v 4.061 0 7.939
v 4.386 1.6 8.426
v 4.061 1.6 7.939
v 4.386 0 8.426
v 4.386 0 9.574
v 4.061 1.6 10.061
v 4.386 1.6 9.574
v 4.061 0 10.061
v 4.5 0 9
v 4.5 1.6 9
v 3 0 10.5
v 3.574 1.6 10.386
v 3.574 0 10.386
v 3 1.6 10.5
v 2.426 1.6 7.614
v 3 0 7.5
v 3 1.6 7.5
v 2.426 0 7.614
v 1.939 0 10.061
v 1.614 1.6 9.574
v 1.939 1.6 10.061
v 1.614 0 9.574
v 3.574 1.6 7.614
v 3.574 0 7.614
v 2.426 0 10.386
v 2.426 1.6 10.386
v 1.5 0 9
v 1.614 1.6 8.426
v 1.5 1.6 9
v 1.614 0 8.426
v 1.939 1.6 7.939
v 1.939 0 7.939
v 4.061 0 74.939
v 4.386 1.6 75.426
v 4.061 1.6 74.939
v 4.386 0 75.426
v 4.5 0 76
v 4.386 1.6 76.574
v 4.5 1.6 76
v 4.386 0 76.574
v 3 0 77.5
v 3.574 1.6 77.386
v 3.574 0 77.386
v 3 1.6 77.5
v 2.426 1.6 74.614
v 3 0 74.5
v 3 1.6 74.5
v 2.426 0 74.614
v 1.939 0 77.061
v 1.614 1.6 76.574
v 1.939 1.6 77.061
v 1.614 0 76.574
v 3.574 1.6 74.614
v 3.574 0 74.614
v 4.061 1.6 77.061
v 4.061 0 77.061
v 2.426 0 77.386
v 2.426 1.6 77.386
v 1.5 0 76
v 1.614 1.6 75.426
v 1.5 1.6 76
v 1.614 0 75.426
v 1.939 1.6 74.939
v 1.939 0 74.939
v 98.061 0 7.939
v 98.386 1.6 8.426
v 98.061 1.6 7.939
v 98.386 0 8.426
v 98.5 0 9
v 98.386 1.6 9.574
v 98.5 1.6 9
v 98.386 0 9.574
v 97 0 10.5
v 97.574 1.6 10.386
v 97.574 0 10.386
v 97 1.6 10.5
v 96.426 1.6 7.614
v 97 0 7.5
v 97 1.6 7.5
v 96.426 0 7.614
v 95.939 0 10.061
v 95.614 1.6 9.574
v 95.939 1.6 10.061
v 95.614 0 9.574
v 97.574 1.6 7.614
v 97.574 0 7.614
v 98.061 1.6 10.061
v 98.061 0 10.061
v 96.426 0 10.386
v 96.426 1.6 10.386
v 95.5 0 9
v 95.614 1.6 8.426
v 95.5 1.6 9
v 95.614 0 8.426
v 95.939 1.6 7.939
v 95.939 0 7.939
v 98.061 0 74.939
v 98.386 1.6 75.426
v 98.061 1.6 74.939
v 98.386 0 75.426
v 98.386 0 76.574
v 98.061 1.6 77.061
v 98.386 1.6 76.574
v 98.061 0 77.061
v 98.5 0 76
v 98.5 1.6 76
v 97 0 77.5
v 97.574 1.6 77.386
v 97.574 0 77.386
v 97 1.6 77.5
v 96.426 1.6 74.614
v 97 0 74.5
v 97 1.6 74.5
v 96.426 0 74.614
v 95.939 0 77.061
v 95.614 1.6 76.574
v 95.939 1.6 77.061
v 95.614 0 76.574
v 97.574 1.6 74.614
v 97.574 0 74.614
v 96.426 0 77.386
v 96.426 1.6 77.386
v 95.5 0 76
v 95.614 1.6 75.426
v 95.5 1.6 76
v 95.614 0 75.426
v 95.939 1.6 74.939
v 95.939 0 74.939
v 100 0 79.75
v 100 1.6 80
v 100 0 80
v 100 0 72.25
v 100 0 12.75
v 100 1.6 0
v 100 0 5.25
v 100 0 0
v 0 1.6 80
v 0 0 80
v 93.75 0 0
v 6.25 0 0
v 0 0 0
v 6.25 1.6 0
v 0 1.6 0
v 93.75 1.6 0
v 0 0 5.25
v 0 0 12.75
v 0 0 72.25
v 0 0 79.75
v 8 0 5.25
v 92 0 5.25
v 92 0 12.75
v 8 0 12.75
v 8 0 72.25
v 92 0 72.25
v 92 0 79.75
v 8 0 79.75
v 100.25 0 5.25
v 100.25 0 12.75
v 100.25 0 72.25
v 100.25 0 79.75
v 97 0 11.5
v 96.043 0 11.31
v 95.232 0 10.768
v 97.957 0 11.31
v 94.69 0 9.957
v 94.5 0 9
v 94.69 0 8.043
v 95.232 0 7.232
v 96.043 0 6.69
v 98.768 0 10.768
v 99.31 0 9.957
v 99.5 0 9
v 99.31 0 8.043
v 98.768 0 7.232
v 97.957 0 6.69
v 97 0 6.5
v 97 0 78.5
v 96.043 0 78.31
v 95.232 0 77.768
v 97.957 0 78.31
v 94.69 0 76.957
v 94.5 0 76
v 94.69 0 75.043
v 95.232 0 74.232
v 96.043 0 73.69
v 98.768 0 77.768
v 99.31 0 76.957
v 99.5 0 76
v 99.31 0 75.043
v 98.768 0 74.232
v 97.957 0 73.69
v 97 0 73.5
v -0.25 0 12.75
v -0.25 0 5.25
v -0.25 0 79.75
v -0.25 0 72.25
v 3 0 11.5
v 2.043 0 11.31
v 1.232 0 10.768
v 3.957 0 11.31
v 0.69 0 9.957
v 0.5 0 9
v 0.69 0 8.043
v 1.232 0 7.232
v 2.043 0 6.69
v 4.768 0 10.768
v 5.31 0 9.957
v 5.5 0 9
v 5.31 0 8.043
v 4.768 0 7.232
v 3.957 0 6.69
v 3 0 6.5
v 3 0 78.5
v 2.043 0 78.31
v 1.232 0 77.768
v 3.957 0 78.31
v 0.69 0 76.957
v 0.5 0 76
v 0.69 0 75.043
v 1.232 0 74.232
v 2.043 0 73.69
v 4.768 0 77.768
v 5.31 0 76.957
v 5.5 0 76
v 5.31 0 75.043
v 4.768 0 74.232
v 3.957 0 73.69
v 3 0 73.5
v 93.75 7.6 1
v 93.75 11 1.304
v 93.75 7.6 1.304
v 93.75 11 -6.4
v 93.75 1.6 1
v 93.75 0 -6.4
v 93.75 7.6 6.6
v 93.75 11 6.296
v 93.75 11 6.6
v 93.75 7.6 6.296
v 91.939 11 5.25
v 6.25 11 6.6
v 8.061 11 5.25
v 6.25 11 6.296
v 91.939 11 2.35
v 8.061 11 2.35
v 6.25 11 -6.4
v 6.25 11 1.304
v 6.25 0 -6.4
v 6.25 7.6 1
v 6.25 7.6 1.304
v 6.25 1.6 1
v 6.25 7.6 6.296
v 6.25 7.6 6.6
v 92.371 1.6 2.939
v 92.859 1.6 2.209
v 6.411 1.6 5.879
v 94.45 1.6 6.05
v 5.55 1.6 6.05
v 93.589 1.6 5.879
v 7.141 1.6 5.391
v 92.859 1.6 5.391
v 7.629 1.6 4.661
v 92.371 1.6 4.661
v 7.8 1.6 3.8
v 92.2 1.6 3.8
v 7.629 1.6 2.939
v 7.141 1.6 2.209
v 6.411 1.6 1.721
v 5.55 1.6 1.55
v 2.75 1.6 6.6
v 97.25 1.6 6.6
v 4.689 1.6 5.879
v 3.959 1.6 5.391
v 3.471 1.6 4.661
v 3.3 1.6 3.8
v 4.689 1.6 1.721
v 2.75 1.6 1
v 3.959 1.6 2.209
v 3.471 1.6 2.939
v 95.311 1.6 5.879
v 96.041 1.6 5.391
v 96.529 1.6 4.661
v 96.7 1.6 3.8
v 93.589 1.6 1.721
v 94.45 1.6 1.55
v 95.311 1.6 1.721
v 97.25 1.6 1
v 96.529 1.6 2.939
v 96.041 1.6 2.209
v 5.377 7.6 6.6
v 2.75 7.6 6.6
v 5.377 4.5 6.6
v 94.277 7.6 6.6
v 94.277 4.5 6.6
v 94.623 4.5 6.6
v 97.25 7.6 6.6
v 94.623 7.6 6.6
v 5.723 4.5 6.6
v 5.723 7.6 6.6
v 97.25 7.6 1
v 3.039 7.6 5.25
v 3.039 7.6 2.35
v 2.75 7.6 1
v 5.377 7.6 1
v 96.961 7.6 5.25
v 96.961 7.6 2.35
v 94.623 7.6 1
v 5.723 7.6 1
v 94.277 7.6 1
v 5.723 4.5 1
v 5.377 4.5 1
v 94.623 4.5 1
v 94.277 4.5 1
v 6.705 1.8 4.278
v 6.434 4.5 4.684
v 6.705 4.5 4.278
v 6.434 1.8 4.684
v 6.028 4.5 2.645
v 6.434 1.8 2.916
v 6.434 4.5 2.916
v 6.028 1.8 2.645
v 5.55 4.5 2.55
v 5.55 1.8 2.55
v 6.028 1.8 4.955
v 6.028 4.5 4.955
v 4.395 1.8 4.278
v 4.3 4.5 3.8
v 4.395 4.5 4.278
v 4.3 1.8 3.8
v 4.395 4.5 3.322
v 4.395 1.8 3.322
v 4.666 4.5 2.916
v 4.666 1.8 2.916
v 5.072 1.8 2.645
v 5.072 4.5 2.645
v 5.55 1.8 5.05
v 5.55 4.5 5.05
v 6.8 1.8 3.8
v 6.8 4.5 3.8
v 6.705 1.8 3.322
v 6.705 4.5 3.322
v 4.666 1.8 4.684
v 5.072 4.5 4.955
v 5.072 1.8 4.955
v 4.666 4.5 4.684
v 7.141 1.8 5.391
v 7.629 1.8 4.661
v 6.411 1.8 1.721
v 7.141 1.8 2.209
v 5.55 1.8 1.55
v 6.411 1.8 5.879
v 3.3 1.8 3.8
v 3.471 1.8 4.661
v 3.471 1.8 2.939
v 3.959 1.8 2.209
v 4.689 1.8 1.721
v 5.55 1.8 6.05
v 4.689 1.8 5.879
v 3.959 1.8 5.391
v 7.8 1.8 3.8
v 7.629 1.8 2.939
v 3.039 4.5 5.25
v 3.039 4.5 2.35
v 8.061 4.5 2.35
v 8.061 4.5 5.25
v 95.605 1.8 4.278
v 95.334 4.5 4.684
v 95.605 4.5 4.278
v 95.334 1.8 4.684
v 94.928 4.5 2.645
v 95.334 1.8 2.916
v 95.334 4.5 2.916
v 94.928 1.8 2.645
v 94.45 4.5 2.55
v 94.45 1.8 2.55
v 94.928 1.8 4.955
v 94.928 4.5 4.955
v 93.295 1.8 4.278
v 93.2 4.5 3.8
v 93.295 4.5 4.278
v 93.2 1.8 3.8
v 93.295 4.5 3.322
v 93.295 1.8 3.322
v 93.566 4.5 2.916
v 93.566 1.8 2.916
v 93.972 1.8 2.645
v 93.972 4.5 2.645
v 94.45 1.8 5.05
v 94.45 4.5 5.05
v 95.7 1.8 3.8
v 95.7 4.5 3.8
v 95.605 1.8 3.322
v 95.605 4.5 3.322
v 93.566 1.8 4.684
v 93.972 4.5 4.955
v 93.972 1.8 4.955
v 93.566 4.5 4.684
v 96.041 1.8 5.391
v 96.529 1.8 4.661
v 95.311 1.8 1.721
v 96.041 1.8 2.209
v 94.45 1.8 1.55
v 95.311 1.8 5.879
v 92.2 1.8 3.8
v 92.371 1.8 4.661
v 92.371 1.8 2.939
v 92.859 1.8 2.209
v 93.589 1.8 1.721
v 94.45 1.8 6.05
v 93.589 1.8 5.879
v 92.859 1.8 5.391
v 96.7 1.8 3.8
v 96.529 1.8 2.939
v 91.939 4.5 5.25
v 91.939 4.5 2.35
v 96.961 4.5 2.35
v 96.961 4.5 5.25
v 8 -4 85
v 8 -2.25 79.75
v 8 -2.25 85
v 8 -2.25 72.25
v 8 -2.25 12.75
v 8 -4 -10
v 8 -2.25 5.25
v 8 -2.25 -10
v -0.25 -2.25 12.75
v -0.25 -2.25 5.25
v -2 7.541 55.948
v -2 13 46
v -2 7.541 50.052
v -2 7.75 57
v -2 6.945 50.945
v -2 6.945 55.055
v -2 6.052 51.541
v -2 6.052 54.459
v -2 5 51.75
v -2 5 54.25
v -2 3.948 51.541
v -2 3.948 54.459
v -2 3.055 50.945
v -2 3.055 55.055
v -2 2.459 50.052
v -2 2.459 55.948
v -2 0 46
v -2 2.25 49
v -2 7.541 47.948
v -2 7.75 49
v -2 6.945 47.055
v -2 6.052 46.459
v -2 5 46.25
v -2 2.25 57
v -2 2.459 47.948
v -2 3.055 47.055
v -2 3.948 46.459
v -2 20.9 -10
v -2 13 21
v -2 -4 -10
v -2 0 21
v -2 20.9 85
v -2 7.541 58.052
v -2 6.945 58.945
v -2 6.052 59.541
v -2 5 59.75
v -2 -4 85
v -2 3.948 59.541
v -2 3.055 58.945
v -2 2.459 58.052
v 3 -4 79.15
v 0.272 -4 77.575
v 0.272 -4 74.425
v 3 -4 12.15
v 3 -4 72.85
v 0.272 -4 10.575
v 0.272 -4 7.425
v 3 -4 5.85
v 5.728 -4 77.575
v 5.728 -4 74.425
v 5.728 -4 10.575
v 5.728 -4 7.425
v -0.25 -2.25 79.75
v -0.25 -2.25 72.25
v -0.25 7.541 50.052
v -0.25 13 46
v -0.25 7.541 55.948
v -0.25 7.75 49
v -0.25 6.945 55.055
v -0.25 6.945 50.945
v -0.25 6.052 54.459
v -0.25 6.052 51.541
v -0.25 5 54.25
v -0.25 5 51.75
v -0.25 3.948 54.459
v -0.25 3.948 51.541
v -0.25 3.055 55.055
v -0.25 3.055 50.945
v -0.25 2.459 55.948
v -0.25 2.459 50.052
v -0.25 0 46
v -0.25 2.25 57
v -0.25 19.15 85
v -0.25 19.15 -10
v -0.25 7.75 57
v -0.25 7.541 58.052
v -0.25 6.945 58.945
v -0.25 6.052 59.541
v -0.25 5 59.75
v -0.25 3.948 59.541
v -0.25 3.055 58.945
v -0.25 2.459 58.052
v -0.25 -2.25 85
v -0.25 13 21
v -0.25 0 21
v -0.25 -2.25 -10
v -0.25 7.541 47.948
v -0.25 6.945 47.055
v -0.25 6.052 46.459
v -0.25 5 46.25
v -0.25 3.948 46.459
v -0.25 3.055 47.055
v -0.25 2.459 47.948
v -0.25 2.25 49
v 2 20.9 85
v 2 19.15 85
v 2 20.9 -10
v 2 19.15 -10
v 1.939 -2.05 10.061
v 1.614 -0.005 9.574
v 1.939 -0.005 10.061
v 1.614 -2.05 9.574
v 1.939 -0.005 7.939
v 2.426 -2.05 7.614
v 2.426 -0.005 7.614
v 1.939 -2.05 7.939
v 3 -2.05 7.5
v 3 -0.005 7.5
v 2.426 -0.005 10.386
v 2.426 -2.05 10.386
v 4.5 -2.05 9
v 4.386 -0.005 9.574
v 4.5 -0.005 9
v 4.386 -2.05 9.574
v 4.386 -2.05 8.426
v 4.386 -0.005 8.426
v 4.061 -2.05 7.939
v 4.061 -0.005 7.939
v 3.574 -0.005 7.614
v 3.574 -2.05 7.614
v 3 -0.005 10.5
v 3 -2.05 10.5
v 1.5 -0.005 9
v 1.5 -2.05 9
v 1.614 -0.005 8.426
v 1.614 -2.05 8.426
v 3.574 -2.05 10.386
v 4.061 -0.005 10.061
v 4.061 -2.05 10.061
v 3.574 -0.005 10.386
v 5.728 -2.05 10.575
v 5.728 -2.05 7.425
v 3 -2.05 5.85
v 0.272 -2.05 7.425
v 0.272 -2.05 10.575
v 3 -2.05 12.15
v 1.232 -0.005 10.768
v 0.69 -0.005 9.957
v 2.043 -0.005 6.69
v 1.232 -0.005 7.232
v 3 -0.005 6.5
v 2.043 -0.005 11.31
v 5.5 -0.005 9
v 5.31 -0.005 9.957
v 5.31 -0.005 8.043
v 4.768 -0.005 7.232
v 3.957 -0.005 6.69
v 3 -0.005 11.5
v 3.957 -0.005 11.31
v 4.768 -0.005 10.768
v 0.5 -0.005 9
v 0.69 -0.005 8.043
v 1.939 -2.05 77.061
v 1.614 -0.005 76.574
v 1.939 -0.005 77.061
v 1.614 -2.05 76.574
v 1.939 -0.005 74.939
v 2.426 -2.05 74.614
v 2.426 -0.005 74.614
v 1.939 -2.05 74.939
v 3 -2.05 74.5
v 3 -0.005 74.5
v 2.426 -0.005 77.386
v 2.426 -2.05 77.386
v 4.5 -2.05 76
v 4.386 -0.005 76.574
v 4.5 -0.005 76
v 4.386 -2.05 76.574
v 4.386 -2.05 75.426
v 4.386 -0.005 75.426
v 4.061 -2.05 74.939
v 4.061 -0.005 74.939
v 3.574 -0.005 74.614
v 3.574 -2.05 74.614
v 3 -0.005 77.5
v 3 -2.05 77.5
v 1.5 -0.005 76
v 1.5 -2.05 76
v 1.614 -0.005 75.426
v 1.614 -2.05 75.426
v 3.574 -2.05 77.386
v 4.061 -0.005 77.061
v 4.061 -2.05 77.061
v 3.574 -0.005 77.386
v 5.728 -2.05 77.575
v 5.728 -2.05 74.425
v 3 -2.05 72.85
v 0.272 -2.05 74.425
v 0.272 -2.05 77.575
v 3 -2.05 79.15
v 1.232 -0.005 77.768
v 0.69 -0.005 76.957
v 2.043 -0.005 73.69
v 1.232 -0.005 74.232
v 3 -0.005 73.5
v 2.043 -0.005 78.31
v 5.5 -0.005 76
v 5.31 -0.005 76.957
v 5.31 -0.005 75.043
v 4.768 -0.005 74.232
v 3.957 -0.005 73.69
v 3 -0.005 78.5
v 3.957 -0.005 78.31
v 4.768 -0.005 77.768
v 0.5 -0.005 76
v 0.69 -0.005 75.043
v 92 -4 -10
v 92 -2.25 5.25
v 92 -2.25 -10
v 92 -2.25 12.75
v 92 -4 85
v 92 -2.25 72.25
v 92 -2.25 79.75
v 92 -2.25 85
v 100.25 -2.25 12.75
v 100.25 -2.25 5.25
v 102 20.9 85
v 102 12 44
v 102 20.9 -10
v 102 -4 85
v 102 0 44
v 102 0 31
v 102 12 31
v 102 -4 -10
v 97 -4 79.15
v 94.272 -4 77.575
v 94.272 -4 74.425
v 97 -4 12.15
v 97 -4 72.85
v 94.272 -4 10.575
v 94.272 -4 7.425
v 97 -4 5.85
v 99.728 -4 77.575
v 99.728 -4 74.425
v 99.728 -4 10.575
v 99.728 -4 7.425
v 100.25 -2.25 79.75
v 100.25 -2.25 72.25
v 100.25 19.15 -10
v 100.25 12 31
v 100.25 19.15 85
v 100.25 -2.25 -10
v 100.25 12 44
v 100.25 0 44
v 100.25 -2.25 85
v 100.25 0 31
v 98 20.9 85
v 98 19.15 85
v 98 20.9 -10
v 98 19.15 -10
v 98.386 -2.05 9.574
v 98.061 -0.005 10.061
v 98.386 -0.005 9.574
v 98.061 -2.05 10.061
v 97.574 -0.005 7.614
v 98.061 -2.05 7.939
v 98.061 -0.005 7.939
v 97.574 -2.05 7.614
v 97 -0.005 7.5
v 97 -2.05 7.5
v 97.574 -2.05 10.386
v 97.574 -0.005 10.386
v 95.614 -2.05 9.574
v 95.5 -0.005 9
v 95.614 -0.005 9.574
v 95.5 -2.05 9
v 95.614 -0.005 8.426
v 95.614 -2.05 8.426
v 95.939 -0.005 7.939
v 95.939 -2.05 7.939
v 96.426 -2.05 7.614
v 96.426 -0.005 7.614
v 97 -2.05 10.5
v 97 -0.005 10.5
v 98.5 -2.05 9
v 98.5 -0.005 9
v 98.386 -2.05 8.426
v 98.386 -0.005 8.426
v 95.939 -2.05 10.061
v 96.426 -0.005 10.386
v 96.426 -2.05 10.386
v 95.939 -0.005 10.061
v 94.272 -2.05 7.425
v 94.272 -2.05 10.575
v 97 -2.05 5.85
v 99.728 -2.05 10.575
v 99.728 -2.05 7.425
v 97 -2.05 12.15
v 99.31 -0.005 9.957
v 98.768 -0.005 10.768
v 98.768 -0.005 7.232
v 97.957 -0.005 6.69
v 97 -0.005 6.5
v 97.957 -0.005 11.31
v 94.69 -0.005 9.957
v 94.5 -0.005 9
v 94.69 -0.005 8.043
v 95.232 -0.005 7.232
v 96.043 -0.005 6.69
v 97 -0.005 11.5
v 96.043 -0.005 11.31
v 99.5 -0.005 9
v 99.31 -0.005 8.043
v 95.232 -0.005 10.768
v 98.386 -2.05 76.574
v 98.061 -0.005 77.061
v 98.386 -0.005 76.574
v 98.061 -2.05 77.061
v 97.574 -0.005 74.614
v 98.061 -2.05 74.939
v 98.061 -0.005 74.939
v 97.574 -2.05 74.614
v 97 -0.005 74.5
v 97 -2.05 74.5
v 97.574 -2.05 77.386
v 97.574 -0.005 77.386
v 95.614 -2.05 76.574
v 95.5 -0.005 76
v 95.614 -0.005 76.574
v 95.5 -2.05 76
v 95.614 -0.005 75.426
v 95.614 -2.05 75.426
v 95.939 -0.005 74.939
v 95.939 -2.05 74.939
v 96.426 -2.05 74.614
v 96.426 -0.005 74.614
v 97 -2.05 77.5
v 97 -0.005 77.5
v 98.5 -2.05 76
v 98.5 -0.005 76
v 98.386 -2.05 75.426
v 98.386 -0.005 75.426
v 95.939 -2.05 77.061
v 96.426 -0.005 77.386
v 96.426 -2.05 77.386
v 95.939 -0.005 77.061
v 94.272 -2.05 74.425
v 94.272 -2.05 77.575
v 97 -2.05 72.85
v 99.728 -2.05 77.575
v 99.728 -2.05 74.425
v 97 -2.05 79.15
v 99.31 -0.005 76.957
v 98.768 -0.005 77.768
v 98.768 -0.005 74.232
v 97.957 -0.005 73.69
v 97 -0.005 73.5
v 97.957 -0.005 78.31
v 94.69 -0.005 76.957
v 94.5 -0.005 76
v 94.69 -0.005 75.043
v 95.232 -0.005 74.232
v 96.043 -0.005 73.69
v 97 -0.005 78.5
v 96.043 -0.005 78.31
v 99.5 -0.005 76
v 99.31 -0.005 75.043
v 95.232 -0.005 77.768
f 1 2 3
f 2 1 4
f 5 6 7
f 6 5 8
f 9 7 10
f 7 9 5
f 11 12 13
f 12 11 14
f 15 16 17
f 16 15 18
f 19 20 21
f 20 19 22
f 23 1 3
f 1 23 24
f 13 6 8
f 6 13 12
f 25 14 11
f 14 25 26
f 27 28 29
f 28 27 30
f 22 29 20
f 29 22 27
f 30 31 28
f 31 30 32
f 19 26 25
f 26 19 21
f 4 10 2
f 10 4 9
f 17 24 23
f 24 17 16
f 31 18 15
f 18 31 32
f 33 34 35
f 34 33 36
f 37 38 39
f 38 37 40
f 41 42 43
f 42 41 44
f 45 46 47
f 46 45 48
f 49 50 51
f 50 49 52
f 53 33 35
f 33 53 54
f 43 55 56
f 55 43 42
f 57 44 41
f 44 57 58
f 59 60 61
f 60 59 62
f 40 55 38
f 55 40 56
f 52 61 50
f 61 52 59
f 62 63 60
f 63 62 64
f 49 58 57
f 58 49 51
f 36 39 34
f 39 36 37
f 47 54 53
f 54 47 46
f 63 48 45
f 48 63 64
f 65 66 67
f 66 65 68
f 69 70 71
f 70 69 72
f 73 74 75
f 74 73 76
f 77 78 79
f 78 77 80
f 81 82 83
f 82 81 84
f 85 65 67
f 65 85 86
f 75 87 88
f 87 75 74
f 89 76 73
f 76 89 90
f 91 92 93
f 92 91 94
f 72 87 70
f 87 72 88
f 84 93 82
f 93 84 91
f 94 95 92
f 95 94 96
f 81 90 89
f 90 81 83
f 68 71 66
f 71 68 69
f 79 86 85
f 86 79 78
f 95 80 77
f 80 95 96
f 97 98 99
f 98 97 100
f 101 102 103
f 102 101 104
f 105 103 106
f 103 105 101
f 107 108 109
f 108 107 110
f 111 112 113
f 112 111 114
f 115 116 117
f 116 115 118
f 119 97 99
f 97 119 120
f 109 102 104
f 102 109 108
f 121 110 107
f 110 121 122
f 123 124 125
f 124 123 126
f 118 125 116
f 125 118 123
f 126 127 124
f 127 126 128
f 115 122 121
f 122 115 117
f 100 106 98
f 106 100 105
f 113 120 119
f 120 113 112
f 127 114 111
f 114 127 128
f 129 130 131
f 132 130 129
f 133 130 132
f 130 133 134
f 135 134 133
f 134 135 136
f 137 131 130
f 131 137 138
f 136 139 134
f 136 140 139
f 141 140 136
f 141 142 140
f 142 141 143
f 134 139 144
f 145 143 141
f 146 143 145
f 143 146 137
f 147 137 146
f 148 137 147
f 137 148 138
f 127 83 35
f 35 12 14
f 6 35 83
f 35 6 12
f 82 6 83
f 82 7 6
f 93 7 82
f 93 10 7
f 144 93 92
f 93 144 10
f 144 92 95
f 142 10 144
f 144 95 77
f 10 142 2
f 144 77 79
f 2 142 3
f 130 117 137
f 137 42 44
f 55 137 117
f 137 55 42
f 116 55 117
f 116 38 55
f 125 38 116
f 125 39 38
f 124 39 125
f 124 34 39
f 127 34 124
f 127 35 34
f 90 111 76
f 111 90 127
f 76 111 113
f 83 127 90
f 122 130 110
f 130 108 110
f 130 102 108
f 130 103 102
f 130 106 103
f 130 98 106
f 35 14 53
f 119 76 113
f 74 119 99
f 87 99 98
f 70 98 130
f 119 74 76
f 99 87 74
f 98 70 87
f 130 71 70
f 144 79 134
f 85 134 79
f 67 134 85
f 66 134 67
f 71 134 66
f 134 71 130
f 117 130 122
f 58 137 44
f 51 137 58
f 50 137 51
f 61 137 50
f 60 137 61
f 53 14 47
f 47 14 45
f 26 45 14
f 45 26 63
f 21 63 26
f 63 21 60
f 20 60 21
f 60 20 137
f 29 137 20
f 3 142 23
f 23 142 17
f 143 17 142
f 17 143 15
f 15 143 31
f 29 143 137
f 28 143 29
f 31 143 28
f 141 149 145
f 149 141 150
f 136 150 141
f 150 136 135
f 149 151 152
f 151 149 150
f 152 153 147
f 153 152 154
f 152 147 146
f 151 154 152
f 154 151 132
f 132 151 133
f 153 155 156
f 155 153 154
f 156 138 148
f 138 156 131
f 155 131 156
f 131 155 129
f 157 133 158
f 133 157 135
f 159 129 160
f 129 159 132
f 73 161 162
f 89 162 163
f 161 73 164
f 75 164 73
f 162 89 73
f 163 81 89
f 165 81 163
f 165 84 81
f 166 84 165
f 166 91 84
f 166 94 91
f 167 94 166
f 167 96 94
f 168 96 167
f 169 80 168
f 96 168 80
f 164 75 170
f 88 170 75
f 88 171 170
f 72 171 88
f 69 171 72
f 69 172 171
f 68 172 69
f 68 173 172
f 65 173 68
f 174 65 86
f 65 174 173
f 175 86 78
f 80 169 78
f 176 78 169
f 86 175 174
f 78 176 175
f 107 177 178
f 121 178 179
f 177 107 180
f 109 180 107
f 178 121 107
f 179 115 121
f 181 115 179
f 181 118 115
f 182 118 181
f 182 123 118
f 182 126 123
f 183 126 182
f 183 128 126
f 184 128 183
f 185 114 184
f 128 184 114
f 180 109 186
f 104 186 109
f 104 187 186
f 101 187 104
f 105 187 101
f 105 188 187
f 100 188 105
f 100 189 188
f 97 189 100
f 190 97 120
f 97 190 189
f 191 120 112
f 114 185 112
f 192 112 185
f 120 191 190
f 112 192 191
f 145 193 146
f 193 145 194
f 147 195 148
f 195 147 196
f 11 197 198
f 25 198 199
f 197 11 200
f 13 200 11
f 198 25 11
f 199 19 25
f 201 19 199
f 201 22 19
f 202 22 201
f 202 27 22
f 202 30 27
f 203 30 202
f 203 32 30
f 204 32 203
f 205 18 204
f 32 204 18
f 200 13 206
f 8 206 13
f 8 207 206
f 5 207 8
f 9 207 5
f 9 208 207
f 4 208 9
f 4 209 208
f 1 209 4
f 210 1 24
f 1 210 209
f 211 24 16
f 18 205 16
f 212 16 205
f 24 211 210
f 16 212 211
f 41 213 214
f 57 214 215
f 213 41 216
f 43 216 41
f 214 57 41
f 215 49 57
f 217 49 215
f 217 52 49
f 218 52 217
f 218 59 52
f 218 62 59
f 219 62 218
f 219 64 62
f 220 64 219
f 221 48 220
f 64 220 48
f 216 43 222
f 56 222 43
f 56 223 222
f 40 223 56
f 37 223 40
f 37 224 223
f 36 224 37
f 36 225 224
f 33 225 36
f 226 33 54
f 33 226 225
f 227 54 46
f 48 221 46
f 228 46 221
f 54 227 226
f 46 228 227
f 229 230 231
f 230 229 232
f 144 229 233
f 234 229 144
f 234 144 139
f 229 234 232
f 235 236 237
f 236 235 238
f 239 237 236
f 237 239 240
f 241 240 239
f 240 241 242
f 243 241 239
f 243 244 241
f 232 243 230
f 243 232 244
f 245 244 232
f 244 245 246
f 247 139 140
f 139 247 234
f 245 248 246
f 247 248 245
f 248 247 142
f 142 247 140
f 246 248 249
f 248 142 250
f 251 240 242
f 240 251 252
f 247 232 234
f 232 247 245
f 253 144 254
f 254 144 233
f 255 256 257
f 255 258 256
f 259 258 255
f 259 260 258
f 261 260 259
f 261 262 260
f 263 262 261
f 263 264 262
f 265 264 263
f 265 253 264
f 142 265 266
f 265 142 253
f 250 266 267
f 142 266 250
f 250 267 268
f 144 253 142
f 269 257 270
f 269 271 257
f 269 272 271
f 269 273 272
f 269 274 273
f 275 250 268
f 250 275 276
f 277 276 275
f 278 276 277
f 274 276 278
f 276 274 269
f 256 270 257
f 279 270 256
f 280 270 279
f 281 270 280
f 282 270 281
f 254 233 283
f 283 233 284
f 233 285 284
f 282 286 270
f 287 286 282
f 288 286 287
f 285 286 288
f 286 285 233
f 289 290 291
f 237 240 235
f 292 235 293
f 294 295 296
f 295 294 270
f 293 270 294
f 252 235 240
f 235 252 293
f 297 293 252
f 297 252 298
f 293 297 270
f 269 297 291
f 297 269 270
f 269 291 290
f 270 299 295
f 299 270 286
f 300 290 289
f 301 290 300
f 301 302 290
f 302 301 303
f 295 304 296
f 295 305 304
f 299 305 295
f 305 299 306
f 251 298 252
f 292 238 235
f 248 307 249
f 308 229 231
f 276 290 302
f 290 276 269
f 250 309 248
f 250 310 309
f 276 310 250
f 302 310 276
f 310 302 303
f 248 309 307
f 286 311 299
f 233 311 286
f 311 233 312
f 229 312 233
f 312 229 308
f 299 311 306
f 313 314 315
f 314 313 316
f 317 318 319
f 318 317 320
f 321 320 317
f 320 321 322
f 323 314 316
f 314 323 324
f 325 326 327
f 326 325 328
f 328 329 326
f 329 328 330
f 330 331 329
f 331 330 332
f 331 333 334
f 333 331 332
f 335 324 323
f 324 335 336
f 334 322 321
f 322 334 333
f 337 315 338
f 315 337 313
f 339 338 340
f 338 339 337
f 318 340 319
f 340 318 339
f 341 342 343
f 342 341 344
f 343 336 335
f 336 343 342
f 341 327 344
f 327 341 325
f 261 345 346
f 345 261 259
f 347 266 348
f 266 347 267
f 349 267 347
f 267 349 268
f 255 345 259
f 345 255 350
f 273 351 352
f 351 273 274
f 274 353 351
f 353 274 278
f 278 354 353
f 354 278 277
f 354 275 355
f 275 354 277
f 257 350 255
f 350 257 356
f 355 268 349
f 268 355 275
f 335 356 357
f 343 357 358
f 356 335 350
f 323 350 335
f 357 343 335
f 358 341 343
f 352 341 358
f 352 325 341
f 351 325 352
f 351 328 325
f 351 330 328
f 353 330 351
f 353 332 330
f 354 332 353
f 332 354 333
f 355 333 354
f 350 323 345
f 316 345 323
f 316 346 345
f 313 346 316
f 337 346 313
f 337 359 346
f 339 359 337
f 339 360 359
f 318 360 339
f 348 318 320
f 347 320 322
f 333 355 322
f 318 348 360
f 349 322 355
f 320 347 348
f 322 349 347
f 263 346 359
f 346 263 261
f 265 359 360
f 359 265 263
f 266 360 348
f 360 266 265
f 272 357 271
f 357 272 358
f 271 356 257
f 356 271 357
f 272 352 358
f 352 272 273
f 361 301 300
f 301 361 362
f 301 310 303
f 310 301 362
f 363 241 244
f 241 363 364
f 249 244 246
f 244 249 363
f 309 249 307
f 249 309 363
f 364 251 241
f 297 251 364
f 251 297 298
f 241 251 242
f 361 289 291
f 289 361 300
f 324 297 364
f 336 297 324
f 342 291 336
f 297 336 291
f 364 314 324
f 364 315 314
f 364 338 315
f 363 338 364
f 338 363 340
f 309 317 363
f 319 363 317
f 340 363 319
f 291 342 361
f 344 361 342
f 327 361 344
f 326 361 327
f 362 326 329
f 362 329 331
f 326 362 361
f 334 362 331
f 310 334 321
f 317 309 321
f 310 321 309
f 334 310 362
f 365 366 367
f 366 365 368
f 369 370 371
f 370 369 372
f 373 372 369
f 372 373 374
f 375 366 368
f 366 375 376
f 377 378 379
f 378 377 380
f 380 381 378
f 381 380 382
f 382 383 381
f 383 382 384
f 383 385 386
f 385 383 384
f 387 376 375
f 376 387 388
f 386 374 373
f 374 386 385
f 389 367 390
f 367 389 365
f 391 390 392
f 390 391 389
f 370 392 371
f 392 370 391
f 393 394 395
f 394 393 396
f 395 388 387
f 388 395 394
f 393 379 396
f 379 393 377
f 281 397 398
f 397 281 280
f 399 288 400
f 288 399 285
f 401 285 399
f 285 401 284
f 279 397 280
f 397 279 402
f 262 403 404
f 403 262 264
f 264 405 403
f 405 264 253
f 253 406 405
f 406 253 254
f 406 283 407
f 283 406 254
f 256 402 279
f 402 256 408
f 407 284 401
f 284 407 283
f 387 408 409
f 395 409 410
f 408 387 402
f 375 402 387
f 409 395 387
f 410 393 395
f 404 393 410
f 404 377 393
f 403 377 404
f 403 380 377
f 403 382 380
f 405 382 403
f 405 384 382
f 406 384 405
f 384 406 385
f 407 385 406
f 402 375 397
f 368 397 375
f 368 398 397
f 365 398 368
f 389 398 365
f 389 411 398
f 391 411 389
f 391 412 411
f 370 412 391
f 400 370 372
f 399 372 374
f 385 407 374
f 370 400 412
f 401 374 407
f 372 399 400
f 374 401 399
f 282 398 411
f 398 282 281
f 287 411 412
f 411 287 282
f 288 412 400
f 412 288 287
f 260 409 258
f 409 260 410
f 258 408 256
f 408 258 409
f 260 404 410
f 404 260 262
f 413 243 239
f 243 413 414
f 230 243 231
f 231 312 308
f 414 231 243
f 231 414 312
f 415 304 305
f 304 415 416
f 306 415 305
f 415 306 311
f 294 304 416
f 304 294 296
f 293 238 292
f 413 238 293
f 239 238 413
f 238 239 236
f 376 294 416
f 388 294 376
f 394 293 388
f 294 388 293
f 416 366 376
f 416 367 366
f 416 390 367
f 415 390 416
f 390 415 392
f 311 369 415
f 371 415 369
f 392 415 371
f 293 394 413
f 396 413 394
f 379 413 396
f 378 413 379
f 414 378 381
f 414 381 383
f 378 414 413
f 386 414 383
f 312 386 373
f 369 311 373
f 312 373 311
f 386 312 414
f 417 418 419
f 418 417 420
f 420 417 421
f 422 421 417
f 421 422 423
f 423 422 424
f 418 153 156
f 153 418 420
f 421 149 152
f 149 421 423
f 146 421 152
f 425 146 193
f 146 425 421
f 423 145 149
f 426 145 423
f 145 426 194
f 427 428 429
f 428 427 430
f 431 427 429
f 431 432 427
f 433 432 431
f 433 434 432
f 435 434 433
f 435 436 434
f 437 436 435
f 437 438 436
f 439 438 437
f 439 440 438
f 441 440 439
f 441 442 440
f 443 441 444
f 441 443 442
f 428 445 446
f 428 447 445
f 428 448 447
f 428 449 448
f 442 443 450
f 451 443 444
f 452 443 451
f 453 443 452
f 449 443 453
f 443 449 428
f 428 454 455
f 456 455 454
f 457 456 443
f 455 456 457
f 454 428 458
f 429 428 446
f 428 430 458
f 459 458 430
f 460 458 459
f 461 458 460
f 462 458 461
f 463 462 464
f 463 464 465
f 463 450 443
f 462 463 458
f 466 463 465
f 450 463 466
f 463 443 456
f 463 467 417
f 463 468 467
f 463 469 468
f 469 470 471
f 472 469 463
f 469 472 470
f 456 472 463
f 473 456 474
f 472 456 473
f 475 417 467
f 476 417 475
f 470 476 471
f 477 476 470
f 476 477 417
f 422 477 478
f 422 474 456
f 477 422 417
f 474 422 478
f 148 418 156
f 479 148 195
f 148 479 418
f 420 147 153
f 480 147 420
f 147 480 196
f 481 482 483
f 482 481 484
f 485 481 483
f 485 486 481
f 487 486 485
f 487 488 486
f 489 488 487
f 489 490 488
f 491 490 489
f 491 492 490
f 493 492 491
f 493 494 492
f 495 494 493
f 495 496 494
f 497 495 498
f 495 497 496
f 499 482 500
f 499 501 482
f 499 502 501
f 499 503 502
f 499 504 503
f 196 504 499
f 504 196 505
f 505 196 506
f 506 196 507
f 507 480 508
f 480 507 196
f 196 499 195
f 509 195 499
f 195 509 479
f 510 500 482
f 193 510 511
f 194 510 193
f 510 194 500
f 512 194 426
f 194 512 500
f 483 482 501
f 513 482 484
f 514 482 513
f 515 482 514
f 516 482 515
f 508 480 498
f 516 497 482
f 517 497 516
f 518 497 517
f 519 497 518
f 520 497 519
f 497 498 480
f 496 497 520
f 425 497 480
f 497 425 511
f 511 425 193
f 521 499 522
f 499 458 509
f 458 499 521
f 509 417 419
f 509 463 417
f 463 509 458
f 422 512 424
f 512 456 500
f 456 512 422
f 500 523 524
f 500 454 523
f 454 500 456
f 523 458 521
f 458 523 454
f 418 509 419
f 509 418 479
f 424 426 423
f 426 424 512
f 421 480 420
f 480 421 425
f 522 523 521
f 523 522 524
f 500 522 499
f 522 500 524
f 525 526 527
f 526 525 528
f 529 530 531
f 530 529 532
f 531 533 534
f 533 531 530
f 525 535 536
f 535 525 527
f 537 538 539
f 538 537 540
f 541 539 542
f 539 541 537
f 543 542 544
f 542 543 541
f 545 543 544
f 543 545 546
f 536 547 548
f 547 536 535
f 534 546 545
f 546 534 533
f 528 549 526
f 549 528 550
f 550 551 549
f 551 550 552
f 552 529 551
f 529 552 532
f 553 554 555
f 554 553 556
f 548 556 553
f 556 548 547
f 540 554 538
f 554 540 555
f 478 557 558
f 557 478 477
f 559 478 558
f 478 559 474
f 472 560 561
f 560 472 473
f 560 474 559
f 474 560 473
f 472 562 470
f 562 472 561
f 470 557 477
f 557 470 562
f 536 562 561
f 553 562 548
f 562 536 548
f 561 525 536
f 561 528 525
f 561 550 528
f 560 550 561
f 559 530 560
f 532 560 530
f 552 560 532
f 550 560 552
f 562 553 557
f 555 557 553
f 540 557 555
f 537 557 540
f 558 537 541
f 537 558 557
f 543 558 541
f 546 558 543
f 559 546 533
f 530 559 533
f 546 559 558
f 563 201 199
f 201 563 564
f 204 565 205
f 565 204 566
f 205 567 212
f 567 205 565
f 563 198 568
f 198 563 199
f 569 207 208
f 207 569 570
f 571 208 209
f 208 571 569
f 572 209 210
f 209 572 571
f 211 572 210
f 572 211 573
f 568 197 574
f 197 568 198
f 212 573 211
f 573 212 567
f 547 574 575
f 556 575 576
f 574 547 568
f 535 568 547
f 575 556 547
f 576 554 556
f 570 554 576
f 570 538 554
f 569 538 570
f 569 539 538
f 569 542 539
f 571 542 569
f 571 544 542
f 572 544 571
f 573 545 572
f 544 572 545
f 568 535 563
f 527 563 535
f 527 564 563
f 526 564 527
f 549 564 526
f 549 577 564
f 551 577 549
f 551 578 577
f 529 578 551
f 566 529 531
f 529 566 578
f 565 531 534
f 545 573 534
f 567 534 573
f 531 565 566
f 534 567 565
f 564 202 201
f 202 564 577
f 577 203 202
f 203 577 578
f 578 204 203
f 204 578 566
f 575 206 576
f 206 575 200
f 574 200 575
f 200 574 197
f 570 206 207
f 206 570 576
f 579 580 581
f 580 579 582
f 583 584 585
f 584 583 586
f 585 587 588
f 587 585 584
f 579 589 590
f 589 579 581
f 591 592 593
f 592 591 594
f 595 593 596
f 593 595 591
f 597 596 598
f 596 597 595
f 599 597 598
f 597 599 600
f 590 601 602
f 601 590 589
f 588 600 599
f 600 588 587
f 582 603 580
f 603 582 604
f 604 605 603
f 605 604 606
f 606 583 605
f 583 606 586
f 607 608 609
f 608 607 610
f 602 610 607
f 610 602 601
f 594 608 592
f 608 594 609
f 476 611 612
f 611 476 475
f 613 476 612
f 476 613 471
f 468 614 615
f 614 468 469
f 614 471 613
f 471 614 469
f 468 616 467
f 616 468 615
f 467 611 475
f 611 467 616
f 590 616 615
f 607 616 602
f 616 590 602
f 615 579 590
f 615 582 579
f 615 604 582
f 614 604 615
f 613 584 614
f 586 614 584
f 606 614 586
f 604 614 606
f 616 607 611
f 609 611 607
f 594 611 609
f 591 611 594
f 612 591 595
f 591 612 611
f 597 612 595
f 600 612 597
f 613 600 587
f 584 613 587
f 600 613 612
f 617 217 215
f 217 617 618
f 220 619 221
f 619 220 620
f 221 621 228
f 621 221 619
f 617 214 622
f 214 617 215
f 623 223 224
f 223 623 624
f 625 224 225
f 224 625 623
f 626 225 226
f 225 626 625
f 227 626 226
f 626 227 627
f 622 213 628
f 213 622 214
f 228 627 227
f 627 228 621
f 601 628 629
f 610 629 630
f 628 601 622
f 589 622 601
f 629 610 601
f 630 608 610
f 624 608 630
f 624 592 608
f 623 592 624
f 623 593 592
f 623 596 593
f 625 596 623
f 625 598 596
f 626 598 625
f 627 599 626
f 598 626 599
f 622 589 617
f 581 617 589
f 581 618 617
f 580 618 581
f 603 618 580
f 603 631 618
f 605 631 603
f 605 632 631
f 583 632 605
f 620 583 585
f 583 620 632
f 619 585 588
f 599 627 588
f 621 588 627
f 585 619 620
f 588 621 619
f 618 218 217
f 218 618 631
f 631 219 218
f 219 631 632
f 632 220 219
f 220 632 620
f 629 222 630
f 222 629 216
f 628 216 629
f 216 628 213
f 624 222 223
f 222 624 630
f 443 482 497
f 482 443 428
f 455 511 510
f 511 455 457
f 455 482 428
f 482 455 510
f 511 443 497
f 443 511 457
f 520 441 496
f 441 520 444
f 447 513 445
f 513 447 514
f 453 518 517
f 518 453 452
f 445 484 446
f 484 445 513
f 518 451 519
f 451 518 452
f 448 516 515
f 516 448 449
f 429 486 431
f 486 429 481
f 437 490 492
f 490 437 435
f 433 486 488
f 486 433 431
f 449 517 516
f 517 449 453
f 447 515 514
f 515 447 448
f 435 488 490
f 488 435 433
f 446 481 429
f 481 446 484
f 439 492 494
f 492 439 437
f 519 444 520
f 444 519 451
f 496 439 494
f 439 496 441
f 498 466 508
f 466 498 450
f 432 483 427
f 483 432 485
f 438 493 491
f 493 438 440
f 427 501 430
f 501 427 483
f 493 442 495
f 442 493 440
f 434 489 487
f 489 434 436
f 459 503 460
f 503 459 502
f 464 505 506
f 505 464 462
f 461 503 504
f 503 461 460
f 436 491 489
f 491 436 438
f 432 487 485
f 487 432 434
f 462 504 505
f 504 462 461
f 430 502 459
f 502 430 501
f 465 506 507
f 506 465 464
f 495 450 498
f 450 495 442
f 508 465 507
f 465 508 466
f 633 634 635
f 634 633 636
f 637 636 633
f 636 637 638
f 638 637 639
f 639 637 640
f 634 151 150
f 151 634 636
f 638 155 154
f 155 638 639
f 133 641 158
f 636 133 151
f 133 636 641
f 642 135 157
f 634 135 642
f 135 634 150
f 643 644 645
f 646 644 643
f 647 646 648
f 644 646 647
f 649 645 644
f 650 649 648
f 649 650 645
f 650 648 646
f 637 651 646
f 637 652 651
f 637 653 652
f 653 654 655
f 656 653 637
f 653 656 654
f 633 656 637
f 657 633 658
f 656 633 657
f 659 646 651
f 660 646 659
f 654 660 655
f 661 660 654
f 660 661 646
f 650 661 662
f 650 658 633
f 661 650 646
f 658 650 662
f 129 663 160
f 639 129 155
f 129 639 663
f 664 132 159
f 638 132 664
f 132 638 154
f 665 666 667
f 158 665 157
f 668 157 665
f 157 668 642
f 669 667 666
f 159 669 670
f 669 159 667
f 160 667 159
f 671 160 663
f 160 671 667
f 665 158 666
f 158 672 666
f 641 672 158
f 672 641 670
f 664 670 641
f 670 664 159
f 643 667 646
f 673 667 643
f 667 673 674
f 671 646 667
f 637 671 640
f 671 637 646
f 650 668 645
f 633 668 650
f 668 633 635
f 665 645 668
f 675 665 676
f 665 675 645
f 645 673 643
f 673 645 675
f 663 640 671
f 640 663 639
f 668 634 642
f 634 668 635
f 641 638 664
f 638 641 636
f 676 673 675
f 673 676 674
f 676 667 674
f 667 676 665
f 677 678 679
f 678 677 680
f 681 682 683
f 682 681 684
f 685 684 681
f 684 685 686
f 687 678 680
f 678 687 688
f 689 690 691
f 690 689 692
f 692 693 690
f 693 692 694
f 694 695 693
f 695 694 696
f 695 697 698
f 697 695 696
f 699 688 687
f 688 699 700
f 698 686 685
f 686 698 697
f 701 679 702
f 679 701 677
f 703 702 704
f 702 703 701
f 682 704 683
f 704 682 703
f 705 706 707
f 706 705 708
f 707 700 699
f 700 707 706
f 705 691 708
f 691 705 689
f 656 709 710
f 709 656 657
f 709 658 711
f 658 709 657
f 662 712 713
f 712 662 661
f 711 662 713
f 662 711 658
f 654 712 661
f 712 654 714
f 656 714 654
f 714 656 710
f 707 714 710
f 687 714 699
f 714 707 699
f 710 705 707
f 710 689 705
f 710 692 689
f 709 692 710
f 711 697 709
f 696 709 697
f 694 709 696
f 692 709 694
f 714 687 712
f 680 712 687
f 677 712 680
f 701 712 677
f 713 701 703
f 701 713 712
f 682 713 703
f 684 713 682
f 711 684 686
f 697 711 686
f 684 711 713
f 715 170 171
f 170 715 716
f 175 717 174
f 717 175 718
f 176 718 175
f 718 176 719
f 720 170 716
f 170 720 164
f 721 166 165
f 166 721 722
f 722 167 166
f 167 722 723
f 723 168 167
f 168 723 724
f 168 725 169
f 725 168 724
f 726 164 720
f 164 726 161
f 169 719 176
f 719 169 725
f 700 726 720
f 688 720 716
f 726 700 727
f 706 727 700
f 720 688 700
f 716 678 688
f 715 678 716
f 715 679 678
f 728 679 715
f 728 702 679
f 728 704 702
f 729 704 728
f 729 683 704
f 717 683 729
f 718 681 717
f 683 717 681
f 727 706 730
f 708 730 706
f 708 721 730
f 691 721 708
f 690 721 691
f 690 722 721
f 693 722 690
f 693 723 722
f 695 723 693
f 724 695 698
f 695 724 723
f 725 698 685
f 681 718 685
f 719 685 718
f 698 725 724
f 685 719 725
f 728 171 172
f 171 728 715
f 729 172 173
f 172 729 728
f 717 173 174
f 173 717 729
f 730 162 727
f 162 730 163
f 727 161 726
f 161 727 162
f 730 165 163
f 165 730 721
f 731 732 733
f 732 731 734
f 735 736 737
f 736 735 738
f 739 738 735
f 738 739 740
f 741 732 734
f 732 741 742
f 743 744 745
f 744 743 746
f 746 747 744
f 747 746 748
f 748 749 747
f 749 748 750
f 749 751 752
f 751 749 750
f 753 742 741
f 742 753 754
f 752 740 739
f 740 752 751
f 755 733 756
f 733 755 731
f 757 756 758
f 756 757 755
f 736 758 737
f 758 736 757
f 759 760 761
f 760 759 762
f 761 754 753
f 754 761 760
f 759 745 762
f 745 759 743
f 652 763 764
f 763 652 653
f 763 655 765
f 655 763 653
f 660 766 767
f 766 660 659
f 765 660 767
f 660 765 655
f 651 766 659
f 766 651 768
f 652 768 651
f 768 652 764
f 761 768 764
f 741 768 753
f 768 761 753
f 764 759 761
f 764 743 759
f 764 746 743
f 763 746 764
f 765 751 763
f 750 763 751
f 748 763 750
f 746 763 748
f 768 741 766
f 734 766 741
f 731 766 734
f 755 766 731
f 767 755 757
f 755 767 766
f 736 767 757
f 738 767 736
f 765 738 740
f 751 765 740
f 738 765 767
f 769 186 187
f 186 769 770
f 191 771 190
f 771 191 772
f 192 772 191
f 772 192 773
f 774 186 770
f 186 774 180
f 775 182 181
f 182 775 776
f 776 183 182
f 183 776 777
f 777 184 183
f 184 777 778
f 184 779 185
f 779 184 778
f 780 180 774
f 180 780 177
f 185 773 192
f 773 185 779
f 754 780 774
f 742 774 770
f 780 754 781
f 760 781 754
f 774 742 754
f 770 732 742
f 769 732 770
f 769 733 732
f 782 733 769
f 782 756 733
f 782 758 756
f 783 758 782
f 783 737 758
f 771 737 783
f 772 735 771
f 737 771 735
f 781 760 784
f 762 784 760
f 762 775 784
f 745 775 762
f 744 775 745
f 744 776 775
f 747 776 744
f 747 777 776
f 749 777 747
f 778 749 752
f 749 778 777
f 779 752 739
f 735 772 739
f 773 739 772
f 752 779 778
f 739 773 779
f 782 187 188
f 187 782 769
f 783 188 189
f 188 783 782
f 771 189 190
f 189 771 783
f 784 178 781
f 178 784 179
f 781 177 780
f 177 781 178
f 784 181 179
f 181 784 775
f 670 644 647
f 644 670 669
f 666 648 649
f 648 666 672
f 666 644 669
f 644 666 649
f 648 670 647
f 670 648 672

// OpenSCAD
// file: ../library/din41612/din41612_male.scad
// din41612 male connector
// =======================

include <din41612_male_dim.scad>

use <../linurs/linurs_screw.scad>

module din41612_male(){ 
  // color("LightGrey")
  difference(){
    union(){
        translate([0,din41612_male_w1/2,din41612_male_h/2-din41612_male_h1])  
        cube([din41612_male_l1,
              din41612_male_w1,
              din41612_male_h],
             center=true);  
      translate([0,(din41612_male_w1-din41612_male_w)/2,(din41612_male_h-din41612_male_h1)/2]) 
        cube([din41612_male_l1,
              (din41612_male_w-din41612_male_w1),
              din41612_male_h-din41612_male_h1],
             center=true);  
      translate([0,din41612_male_w2/2+din41612_male_w1-din41612_male_w,din41612_male_h2/2])
        cube([din41612_male_l,
              din41612_male_w2,
              din41612_male_h2],
             center=true);  
    }
    for(i=[-1,1]){ // mounting holes
      translate([i*din41612_male_dl/2,
                 din41612_male_w1-din41612_male_w+din41612_male_w2/2, 
                 din41612_male_h1])
      rotate([180,0,90])screw_fix(
            w=din41612_male_h2, 
            d=M2_5, 
            type=head_cyl, 
            nut_sink=din41612_male_h,
            t=0);
    }
  }
}
din41612_male();  
// file: ../library/din41612/din41612_male_dim.scad
include <../linurs/linurs_screw_dim.scad>

// connector dimensions
din41612_male_l=94.5;    // lenght of the connector
din41612_male_l1=87.5;   // 
din41612_male_w=13;      // width of the connector
din41612_male_w1=6.4;    // 
din41612_male_w2=5.6;    // 
din41612_male_h=11;      // height of the connector
din41612_male_h1=1.6;    // 
din41612_male_h2=6;      // 

din41612_male_dl=88.9;   // distance between mounting holes
// file: ../library/din41612/din41612_female_dim.scad
include <../linurs/linurs_screw_dim.scad>

// connector dimensions
din41612_female_l=95;       // lenght of the connector
din41612_female_l1=85;      // lenght of the connector head
din41612_female_h=11.6;     // height of the connector
din41612_female_h1=5.2;     // height produced by the connector when pulgged in 
din41612_female_w=11;       // width of the connector
din41612_female_w1=8.5;     // width of the connector head

din41612_female_dl=90;      // distance between mounting holes
// file: ../pcb/pcb.scad
// pcb
// ===
// The pcb is the master object and has its 
// lower left corner solder side at the origin of the 
// coordinate system 

n=2;  // [1,2,3,4,5,6,7,8]
show_pcb="assemblies"; // [assemblies,assembly,pcb]

include <pcb_dim.scad>
include <../motherboard/motherboard_dim.scad>

use <../library/din41612/din41612_male.scad>

module pcb(){
  echo("pcb");  
  color("greenyellow")
  difference(){
    cube([pcb_l,pcb_h,pcb_w]); // pcb
    for(x=[-1,1]){ // mounting holes
      for(y=[pcb_wd1,pcb_wd1+pcb_wd]){
        translate([x*pcb_ld/2+pcb_l/2,0,y])
        rotate([90,0,0])
        cylinder(d=pcb_d,h=3*pcb_h,center=true,$fn=16);
      }
    }
  }
}

module pcb_assembly(){
  echo("pcb assembly");  
  pcb();  
  translate([pcb_l/2,pcb_h,0])  
  rotate([-90,0,0])din41612_male();  
}

module pcb_assemblies(n=1){
  echo("pcb assemblies"); 
  for(i=[0:n-1]){ // add the connectors
      echo(i);
      translate([0,step*i,0])
      pcb_assembly();
  }    
}    

if(show_pcb=="assemblies"){
  pcb_assemblies(n=n);
}

if(show_pcb=="assembly"){
  pcb_assembly();
}

if(show_pcb=="pcb"){
    // Move to center to create 2D drawings from top view 
    // with script OpenSCAD22d.py
    //
    rotate([90,0,180])
    //
    translate([-pcb_l/2,-pcb_h/2,-pcb_w/2])
    pcb();
}
// file: ../bracket/bracket.scad
// bracket
// =======
// A bracket of the elecbox module
// - type: 0 front bracket, 1 rear bracket
// - width 1..n in steps

// parameters for customizer
// bracket width
n=2; // [1,2,3,4,5,6,7,8]
// type
bracket="Front"; // [Front,Back]
// intermediate mounting holes
intermediate=false;  

include <../pcb/pcb_dim.scad>

include <../motherboard/motherboard_dim.scad>
include <../library/linurs/linurs_screw_dim.scad>
include <bracket_dim.scad>

use <../library/linurs/linurs_screw.scad>
    
module back_bracket(n=1, intermediate=false){
  mirror([1,0,0])       // mirror it if desired
  front_bracket(n=n, intermediate=intermediate); 
}
    
module front_bracket(n=1, intermediate=false){
  echo("bracket");  
  //color("White")
  intermediatestep=(intermediate)?step:0; 
  difference(){
    union(){
      translate([-bracket_h2/2-bracket_gap/2,
                 bracket_w(n)/2-bracket_w1,
                 bracket_l/2])  
      cube([bracket_h2,
            bracket_w(n),
            bracket_l],center=true); // create the bracket front
  
      translate([bracket_h/2-bracket_h2-bracket_gap/2,
                 bracket_t/2-bracket_w1,
                 bracket_l/2]) 
      cube([bracket_h,
            bracket_t,
            bracket_l],center=true); // U shape side of the screw
      
      translate([bracket_h1/2-bracket_h2-bracket_gap/2,
                 bracket_w(n)-bracket_w1-bracket_t/2,
                 bracket_l/2]) 
      cube([bracket_h1,
            bracket_t,
            bracket_l],center=true); // U shape where no screw  
      for(x=[1:n]){  // create the mounting hole cubes 
        for(z=[bracket_l1,
               bracket_l1+bracket_ld]){
          translate([ bracket_h/2-bracket_h2-bracket_gap/2,
                     -bracket_w1/2+(x-1)*intermediatestep,
                     z])
          cube([bracket_h,
                bracket_w1,
                bracket_l2],center=true);
        }
      }   
    }
    for(x=[1:n]){ // create the mounting hole 
      for(z=[bracket_l1,
             bracket_l1+bracket_ld]){
        translate([bracket_h3-bracket_h2-bracket_gap/2,
                  -bracket_w1/2+(x-1)*intermediatestep,
                   z])
        rotate([0,90,0])
        rotate([-90,0,0])
        screw_fix(w=bracket_w1,d=bracket_screw,type=head_no, t=bracket_screw_gap);
      }
    }
  }
}

if(bracket=="Front"){
  front_bracket(intermediate=intermediate,n=n);
}

if(bracket=="Back"){
  back_bracket(intermediate=intermediate,n=n);
}
// file: ../library/linurs/linurs_screw.scad
// Metric screws and nuts 
// urs@linurs.org 2019
// It is targeted for 3D printing applications. 
// To look realistic is not the goal (Example: Nuts do not have a hole)

include <linurs_screw_dim.scad>

d=0; //[0:M2_5,1:M3,2:M4,3:M5]
type=0;//[0:head_cyl,1:head_cnt,2:head_no,3:head_hex]
w=15; 
i=10;
nut_sink=0;
screw_sink=0; 
t=0.01;
fn=16;

/* [hex_bolt] */
show_hex_bolt=false;

/* [nut] */
show_nut=false;

/* [screw] */
show_screw=false;

/* [screw_fix] */
show_screw_fix=false;

/* [screw_cut] */
show_screw_cut=false;

/* [nut_cut] */
show_nut_cut=false;
wi=0; 
rot=false;

// functions used multiple times to position nuts and heads
function headh_cyl(d)=screw_cyl[d][1];  // height of cyl screw head
function headh_cnt(d)=screw_cyl[d][1];  // height of cnt screw head
function headh(d,type=head_cyl)=(type==head_cyl ? headh_cyl(d) : (type==head_cnt ? headh_cnt(d) : 0 )); // height of screw head 

function nuth(d)=screw_hex[d][2];   // height of hex nut

// head of a cylinder screw
module screw_head_cyl(d=M3, t=0)
{
  screwhd=screw_cyl[d][0]+t; // diameter of cylinder screw head
  cylinder(d=screwhd,h=headh(d=d, type=head_cyl), center=true,$fn=16); // screw head
}

// head of a countersunk screw
module screw_head_cnt(d=M3, t=0)
{
  screwd=screw_d[d]+t; 
  screwhd=screw_cnt[d][0]+t; // diameter of cylinder screw head
  cylinder(d1=screwd,d2=screwhd,h=headh(d=d,type=head_cnt), center=true,$fn=16); // screw head
}

// head of a hex screw
module screw_head_hex(d=M3, t=0)
{
    translate([0,0,-nuth(d)/2])nut(d=d, t=t);
}

// head of all screws
module screw_head(d=M3, type=head_cyl, t=0)
{ 
  if(type==head_cnt){
    screw_head_cnt(d=d, t=t);
  } else {
    if(type==head_cyl){
      screw_head_cyl(d=d, t=t);
    } else {
       if(type==head_hex){
           screw_head_hex(d=d, t=t); 
       } 
    }    
  }
}

// hex bolt 
module hex_bolt(d=M3, w=10, t=0)
{
  nutd=screw_hex[d][1]+t; // outer diameter of hex bolt
  cylinder(r=nutd/2,h=w+t, center=true,$fn=6); // nut
}

// nut 
module nut(d=M3, t=0)
{
  hex_bolt(d=d, w=nuth(d), t=t);    
}

// screw 
// w outer width of the screw = screw length + head 
module screw(w=10, d=M3, type=head_cyl, t=0){
  screwd=screw_d[d]+t;       // screw diameter
  cylinder(d=screwd, h=w, center=true,$fn=16); // screw thread length
  translate([0,0,w/2-headh(d=d,type=type)/2])
  screw_head(d=d,type=type, t=t);
}

// screw fix
// w outer width of the screw = screw length + head 
// sink additional material below to remove 
// raise additional material above to remove
module screw_fix(w=10, d=M3, type=head_cyl, screw_sink=0, nut_sink=0, t=0){
  screw(w=w, d=d, type=type, t=t);
  translate([0,0,-w/2+nuth(d)/2])
    nut(d=d,t=t);
  //additional material to be removed above the nut  
  translate([0,0,-(w+nut_sink)/2])hex_bolt(d=d,w=nut_sink+0.01,t=t);    
  //additional material to be removed above the screw head
  if(type==head_cnt){  
    translate([0,0,w/2+screw_sink])
    cylinder(d=screw_cnt[d][0]+t,h=screw_sink+0.01,center=true,$fn=16);
  }else{ 
    translate([0,0,(w+screw_sink)/2])
    cylinder(d=screw_cyl[d][0]+t,h=screw_sink+0.01,center=true,$fn=16);
  }     
}

// screw cut
// material to be extracted from object to slide in a counter sunk screw for fixation
// w height of the cut out
// i depth of the screw
module screw_cut(d=M3,w=20,i=10,t=0,fn=32){
    hsh=screw_cnt[d][1];
    ws=screw_cnt[d][0]+t;
    ds=screw_d[d]+t;
    
    translate([i/2,0,-(w-hsh)/2])
      cube([i,ws,hsh],center=true);
    
    translate([0,0,-(w-hsh)/2])
      cylinder(d=ws,h=hsh,center=true,$fn=32);
    
    translate([0,0,-(w-hsh)/2+hsh])
        cylinder(d2=ds, d1=ws, h=hsh,center=true,$fn=fn);
    
    cylinder(h=w, d=ds, center=true, $fn=fn);   
    
    translate([i/2,0,0]) 
        cube([i,ds,w],center=true);
    
    for(y=[-1,1]){
        translate([i/2,y*ds/2,-w/2+hsh])
            rotate([45,0,0])
            cube([i,sqrt(2)*(ws-ds)/2,sqrt(2)*(ws-ds)/2],center=true);
    }
}
//screw_cut();

// nut cut
// material to be extracted from object to slide in a nut for fixation
// w height of the cylinder
// i lenght of the inlet
module nut_cut(w=10, wi=0, d=M3, i=10, t=0, rot=false,type=head_cyl){ 
  r=(rot)?90:0;
  ds=(rot)?screw_hex[d][1]:screw_hex[d][0];
  rotate([0,0,r])nut(d,t);
  translate([i/2,0,0])
    cube([i,ds+t,nuth(d)+t],center=true);
  translate([0,0,-wi])
      if(type==head_cnt){    
          screw(w=w, d=d, type=type, t=t); 
        translate([0,0,w/2])
          cylinder(d=screw_cnt[d][0]+t,h=raise,center=true,$fn=16);
      }
      else{ 
          screw(w=w, d=d, type=type, t=t);   
  //      translate([0,0,0])
          //#cylinder(d=screw_cyl[d][0]+t,h=w,center=true,$fn=16);
      }       
}

if(show_hex_bolt==true){
   hex_bolt(d=d, w=w, t=t);
}

if(show_nut==true){
  nut(d=d, t=t);
}    

if(show_screw==true){
   screw(w=w, d=d, type=type, t=t);
}

if(show_screw_fix==true){
  screw_fix(w=w, d=d, type=type, nut_sink=nut_sink, screw_sink=screw_sink, t=t);
}

if(show_screw_cut==true){
  screw_cut(d=d,w=w,i=i,t=t,$fn=fn);
}    

if(show_nut_cut==true){
  nut_cut(w=w, wi=wi, d=d, i=i, t=t,rot=rot,type=type);
}  
// file: ../library/linurs/linurs_screw_dim.scad
// Metric screws and nuts 
// urs@linurs.org

// contains dimensions of linurs_screw and can be included in other 
// OpenScad files 

// Parameters in this file
// d screw diameter M2_5, M3, ... (enumeration with screw_d)
// t millimeters added to diameters 

// enumerations of metric threads
M2_5=0;
M3=1;
M4=2;
M5=3;

// enumerations screw head type
head_cyl=0; // cylinder
head_cnt=1; // countrsunk
head_no=2;  // no head at all
head_hex=3;  // no head at all

// screw diameters
screw_d=[
2.5, // M2.5
3.0, // M3
4.0, // M4
5.0  // M5
];

// sizes for hex nuts
screw_hex=[
//   s,   e,   h
 [ 5.0, 5.8, 1.7], // M2.5
 [ 5.5, 6.4, 2.0], // M3
 [ 7.0, 8.1, 2.8], // M4
 [ 8.0, 9.2, 3.5]  // M5
];

// sizes for cylinder screw heads
screw_cyl=[
//   d,   h
 [ 4.5, 1.6], // M2.5
 [ 5.5, 2.0], // M3
 [ 7.0, 2.6], // M4
 [ 8.5, 3.3]  // M5
];

// sizes for countersunk screw heads
screw_cnt=[
//   d,   h
 [ 4.7, 1.50], // M2.5
 [ 5.6, 1.65], // M3
 [ 7.4, 2.20], // M4
 [ 9.2, 2.50]  // M5
];
// file: ../motherboard/motherboard_dim.scad
include <../library/linurs/linurs_screw_dim.scad>
include <../library/din41612/din41612_female_dim.scad>
include <../library/din41612/din41612_male_dim.scad>
include <../pcb/pcb_dim.scad>
// motherboard pcb dimensions
motherboard_l=pcb_l;   // pcb width
motherboard_h=1.6;     // pcb thickness
step=25.4;             // distance between modules

function motherboard_w(n)=din41612_female_w+step*(n-1);

screw_motherboard_d=M2_5;
screw_motherboard_l=16;
motherboard_pass=0.5;// gap to fit screws 

motherboard_z_offset=-din41612_male_w1-din41612_female_h1-motherboard_h;
// file: ../bracket/bracket_dim.scad
// bracket

include <../pcb/pcb_dim.scad>
include <../motherboard/motherboard_dim.scad>
include <../library/linurs/linurs_screw_dim.scad>

bracket_screw=M2_5;   // hole for the screw

bracket_gap=0.5;      // gap between bracket to make sure it fits in the box
bracket_screw_gap=0.5;// gap to fit the screw

bracket_l=pcb_w+15;   // height of bracket
bracket_l1=19;        // hole l
bracket_l2=3*screw_d[bracket_screw];
bracket_ld=pcb_wd;    // hole distance

bracket_h=10;         // depth of the U shape at the side of the screw
bracket_h1=4;         // depth of the U shape at the side where no screw is 
bracket_h2=2-bracket_gap/2;   // thickness of bracket
bracket_h3=5;         // hole h

bracket_w1=4;         // height of the mounting hole cube
bracket_tn=2;         // thickness of bracket
bracket_t=bracket_tn-bracket_gap/2;  // thickness of bracket - gap

bracket_offset_z=-10;  // bracket offset in elecbox z axis

function bracket_w(n)=step*n-bracket_gap;
function bracket_w2(n)=step*n-2*bracket_tn;
// file: ../pcb/pcb_dim.scad
// The pcb is the master object of the project
// therefore no other include files from other objects
// are necessary

// pcb constants
pcb_l =100;  // lenght of the pcb
pcb_ld = 94; // hole distance 
pcb_w=80;    // height of the pcb
pcb_wd = 67; // hole distance
pcb_wd1 = 9; // hole to edge distance 
pcb_d=3;     // diameter of holes
pcb_h=1.6;   // thickness
// main file
// I2C module
// ==========

I2C="assembly"; // [assembly,front,back, print_front,print_back]

include <../pcb/pcb_dim.scad>
include <../bracket/bracket_dim.scad>
include <../motherboard/motherboard_dim.scad>
include <../library/linurs/linurs_screw_dim.scad>

use <../library/linurs/linurs_screw.scad>
use <../bracket/bracket.scad>
use <../pcb/pcb.scad>

module I2C_back(){
    h1=12;
    w1=13;
    z1=31;
    
    difference(){
        translate([0,0,bracket_offset_z])back_bracket(n=1);
        
        translate([
          0,
          h1/2,
          z1+w1/2])
        cube([
          bracket_h,
          h1,
          w1],center=true);       
    }
}

module I2C_front(){
    h1=13;
    w1=25;
    z1=21;
    
    dx=5.5;
    hx=5;
    z2=49;
    z3=57;
    
    difference(){
        translate([0,0,bracket_offset_z])front_bracket(n=1);
        
        translate([
          0,
          h1/2,
          z1+w1/2])
        cube([
          bracket_h,
          h1,
          w1],center=true); 
        
        translate([
          0,
          hx,
          z2])rotate([0,90,0])
          cylinder(h=bracket_h,d=dx,center=true, $fn=16);    
        
        translate([
          0,
          hx,
          z3])rotate([0,90,0])
          cylinder(h=bracket_h,d=dx,center=true, $fn=16);      
    }
}

module I2C_assembly(){
    pcb_assembly();
    I2C_front();
    translate([pcb_l,0,0])I2C_back();
}

if(I2C=="assembly"){
  I2C_assembly();
}

if(I2C=="front"){
  I2C_front();
}

if(I2C=="back"){
  I2C_back();
}

if(I2C=="print_front"){
  rotate([0,-90,0])
    I2C_front();
}

if(I2C=="print_back"){
  rotate([0,90,0])I2C_back();
}
